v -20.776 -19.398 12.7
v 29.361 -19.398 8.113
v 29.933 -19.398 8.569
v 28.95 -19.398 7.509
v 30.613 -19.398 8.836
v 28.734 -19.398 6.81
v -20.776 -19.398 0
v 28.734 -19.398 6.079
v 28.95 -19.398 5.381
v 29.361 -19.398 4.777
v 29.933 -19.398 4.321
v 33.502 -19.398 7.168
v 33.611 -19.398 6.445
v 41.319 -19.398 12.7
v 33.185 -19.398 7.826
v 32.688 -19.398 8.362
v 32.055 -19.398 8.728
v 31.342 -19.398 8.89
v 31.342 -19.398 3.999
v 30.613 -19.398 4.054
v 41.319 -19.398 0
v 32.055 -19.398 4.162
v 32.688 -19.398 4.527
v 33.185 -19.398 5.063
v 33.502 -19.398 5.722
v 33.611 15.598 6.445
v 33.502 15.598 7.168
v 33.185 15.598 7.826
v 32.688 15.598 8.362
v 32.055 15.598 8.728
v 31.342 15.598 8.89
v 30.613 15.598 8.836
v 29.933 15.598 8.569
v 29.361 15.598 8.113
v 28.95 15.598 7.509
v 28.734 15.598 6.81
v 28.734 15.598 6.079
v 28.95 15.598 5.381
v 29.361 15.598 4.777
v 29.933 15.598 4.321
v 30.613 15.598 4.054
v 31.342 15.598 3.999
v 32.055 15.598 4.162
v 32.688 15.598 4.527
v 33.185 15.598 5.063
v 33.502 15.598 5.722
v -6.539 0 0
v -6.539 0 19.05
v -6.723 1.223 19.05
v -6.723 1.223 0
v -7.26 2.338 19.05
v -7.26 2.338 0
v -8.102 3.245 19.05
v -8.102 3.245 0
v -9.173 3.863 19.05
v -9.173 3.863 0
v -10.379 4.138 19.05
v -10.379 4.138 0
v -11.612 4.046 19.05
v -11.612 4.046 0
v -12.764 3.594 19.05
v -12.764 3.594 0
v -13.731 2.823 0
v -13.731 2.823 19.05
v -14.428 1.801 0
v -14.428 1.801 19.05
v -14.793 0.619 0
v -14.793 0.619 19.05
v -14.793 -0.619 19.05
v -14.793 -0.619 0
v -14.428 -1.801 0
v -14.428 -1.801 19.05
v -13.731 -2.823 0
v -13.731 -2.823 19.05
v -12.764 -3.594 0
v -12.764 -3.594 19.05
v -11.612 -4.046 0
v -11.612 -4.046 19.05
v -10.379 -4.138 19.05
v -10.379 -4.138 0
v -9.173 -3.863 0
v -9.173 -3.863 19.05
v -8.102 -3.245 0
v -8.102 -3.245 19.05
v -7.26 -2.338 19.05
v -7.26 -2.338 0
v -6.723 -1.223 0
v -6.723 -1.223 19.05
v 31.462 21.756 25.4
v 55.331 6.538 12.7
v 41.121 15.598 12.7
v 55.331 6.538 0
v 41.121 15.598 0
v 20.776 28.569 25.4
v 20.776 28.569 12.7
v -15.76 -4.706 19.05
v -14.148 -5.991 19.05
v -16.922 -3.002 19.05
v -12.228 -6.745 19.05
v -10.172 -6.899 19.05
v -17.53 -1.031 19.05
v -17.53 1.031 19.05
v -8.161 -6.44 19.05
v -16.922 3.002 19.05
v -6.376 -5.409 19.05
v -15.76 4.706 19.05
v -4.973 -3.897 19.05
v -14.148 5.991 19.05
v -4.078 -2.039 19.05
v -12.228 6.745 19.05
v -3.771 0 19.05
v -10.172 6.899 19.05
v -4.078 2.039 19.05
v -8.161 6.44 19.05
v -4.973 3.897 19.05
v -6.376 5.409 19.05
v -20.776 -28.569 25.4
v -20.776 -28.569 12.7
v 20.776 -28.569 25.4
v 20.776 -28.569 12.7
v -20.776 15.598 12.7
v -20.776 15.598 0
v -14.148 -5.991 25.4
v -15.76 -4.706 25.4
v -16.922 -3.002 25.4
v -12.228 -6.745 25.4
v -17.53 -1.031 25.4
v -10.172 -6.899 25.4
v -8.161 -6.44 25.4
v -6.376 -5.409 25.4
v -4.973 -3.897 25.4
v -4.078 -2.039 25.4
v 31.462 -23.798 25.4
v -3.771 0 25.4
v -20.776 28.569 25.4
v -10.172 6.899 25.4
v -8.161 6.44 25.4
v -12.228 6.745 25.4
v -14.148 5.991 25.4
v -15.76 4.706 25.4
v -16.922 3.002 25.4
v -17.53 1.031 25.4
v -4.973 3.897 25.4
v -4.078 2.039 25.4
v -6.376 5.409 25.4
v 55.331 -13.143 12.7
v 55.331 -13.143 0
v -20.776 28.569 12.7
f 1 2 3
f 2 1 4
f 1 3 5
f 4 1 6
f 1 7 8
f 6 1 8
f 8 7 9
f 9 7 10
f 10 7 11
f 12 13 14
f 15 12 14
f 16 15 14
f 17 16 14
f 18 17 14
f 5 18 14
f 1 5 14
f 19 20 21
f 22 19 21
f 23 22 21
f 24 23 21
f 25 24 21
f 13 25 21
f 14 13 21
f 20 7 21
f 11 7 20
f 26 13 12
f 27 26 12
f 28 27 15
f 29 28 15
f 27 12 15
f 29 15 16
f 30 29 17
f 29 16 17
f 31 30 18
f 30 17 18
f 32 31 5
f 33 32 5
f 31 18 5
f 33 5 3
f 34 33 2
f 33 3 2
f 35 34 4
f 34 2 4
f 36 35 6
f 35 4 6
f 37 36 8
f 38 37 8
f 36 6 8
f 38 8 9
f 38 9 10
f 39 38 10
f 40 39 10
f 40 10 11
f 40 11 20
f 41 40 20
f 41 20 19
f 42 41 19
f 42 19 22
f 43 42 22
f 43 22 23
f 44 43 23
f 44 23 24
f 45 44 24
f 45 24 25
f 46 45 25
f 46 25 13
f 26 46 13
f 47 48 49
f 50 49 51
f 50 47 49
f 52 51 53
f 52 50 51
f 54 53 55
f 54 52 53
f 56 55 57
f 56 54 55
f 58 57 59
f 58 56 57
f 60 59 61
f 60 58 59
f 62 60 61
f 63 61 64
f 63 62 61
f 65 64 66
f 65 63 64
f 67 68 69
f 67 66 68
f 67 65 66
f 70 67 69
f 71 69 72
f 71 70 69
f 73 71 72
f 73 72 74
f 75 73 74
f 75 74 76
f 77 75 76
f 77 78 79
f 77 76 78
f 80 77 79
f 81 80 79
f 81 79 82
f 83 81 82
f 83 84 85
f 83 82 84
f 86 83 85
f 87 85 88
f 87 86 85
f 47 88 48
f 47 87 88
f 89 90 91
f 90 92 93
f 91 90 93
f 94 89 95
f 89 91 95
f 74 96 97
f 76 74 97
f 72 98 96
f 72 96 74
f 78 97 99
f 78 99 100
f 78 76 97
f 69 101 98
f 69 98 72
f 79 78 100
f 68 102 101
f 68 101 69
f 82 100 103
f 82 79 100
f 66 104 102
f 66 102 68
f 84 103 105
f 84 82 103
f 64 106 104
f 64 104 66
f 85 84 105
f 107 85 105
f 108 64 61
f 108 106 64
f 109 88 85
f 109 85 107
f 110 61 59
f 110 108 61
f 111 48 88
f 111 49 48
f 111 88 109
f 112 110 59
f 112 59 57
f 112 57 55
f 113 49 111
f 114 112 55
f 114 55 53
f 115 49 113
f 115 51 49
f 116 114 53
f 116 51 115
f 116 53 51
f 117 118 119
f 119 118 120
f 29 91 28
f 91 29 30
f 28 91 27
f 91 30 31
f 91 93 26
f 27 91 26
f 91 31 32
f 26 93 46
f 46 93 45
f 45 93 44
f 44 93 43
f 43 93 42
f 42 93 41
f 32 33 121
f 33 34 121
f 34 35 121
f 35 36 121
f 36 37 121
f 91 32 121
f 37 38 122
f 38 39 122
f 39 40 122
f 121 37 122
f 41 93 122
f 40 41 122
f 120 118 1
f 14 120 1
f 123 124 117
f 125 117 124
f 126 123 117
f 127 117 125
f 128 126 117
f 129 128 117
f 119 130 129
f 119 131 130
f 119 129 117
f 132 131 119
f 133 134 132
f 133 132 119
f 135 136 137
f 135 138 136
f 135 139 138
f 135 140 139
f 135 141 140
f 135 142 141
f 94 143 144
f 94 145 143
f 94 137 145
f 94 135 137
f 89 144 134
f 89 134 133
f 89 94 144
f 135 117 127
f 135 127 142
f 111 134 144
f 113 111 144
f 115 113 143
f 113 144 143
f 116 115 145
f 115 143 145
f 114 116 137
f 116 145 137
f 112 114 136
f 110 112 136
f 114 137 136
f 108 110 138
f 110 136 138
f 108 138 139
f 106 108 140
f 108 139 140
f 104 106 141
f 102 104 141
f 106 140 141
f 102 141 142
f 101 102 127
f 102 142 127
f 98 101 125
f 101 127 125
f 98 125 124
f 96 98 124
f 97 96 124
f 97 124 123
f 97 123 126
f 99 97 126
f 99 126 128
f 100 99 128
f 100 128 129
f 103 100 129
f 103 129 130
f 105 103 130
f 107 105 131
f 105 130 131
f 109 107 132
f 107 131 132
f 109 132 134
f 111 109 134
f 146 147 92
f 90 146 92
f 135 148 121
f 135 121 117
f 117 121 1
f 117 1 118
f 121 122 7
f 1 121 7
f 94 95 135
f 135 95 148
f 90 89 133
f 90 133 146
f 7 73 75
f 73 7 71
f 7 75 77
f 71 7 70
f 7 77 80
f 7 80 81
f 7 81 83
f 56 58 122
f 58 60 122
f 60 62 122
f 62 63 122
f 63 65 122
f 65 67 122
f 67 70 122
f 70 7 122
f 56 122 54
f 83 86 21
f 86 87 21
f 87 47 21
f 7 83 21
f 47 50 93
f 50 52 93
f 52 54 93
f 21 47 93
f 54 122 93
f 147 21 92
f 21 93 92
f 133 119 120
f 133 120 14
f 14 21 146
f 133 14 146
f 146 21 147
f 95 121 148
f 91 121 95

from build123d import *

# Parameters (mm, degrees)
F0_R     = 4.149951
F1_DEPTH = 25.4
F3_DEPTH = 50.8
F5_DEPTH = 12.7
F6_R     = 6.918171
F7_DEPTH = 6.35
F8_R     = 2.452339
F9_DEPTH = 47.968393


with BuildPart() as f1:
    # F0 (on Top) → F1 (new body)
    with BuildSketch(Plane.XY):
        Polygon((20.776082, 28.569183), (-20.776082, 28.569183), (-20.776082, -28.569183), (20.776082, -28.569183), (55.331081, -13.142847), (55.331081, 6.537836), align=None)
        with Locations((-10.68896, 0)):
            Circle(F0_R, mode=Mode.SUBTRACT)
    extrude(amount=F1_DEPTH)

    # F2 (on Front) → F3 (cut, symmetric)
    with BuildSketch(Plane.XZ):
        Polygon((31.462464, 25.4), (55.331081, 12.7), (55.331081, 25.4), align=None)
    extrude(amount=F3_DEPTH, both=True, mode=Mode.SUBTRACT)

    # F4 (on face) → F5 (cut)
    with BuildSketch(Plane(origin=(0, 0, 0), x_dir=(1, 0, 0), z_dir=(0, 0, -1))):
        Polygon((20.776082, 28.569183), (-20.776082, 28.569183), (-20.776082, 19.398211), (41.319063, 19.398211), align=None)
        Polygon((41.120535, -15.598102), (-20.776082, -15.598102), (-20.776082, -28.569183), (20.776082, -28.569183), align=None)
    extrude(amount=-F5_DEPTH, mode=Mode.SUBTRACT)

    # F6 (on face) → F7 (cut)
    with BuildSketch(Plane.XY.offset(25.4)):
        with Locations((-10.68896, 0)):
            Circle(F6_R)
    extrude(amount=-F7_DEPTH, mode=Mode.SUBTRACT)

    # F8 (on face) → F9 (cut, through all)
    with BuildSketch(Plane.XZ.offset(19.398211)):
        with Locations((31.159063, 6.444813)):
            Circle(F8_R)
    extrude(amount=-F9_DEPTH, mode=Mode.SUBTRACT)


solid = f1.part
